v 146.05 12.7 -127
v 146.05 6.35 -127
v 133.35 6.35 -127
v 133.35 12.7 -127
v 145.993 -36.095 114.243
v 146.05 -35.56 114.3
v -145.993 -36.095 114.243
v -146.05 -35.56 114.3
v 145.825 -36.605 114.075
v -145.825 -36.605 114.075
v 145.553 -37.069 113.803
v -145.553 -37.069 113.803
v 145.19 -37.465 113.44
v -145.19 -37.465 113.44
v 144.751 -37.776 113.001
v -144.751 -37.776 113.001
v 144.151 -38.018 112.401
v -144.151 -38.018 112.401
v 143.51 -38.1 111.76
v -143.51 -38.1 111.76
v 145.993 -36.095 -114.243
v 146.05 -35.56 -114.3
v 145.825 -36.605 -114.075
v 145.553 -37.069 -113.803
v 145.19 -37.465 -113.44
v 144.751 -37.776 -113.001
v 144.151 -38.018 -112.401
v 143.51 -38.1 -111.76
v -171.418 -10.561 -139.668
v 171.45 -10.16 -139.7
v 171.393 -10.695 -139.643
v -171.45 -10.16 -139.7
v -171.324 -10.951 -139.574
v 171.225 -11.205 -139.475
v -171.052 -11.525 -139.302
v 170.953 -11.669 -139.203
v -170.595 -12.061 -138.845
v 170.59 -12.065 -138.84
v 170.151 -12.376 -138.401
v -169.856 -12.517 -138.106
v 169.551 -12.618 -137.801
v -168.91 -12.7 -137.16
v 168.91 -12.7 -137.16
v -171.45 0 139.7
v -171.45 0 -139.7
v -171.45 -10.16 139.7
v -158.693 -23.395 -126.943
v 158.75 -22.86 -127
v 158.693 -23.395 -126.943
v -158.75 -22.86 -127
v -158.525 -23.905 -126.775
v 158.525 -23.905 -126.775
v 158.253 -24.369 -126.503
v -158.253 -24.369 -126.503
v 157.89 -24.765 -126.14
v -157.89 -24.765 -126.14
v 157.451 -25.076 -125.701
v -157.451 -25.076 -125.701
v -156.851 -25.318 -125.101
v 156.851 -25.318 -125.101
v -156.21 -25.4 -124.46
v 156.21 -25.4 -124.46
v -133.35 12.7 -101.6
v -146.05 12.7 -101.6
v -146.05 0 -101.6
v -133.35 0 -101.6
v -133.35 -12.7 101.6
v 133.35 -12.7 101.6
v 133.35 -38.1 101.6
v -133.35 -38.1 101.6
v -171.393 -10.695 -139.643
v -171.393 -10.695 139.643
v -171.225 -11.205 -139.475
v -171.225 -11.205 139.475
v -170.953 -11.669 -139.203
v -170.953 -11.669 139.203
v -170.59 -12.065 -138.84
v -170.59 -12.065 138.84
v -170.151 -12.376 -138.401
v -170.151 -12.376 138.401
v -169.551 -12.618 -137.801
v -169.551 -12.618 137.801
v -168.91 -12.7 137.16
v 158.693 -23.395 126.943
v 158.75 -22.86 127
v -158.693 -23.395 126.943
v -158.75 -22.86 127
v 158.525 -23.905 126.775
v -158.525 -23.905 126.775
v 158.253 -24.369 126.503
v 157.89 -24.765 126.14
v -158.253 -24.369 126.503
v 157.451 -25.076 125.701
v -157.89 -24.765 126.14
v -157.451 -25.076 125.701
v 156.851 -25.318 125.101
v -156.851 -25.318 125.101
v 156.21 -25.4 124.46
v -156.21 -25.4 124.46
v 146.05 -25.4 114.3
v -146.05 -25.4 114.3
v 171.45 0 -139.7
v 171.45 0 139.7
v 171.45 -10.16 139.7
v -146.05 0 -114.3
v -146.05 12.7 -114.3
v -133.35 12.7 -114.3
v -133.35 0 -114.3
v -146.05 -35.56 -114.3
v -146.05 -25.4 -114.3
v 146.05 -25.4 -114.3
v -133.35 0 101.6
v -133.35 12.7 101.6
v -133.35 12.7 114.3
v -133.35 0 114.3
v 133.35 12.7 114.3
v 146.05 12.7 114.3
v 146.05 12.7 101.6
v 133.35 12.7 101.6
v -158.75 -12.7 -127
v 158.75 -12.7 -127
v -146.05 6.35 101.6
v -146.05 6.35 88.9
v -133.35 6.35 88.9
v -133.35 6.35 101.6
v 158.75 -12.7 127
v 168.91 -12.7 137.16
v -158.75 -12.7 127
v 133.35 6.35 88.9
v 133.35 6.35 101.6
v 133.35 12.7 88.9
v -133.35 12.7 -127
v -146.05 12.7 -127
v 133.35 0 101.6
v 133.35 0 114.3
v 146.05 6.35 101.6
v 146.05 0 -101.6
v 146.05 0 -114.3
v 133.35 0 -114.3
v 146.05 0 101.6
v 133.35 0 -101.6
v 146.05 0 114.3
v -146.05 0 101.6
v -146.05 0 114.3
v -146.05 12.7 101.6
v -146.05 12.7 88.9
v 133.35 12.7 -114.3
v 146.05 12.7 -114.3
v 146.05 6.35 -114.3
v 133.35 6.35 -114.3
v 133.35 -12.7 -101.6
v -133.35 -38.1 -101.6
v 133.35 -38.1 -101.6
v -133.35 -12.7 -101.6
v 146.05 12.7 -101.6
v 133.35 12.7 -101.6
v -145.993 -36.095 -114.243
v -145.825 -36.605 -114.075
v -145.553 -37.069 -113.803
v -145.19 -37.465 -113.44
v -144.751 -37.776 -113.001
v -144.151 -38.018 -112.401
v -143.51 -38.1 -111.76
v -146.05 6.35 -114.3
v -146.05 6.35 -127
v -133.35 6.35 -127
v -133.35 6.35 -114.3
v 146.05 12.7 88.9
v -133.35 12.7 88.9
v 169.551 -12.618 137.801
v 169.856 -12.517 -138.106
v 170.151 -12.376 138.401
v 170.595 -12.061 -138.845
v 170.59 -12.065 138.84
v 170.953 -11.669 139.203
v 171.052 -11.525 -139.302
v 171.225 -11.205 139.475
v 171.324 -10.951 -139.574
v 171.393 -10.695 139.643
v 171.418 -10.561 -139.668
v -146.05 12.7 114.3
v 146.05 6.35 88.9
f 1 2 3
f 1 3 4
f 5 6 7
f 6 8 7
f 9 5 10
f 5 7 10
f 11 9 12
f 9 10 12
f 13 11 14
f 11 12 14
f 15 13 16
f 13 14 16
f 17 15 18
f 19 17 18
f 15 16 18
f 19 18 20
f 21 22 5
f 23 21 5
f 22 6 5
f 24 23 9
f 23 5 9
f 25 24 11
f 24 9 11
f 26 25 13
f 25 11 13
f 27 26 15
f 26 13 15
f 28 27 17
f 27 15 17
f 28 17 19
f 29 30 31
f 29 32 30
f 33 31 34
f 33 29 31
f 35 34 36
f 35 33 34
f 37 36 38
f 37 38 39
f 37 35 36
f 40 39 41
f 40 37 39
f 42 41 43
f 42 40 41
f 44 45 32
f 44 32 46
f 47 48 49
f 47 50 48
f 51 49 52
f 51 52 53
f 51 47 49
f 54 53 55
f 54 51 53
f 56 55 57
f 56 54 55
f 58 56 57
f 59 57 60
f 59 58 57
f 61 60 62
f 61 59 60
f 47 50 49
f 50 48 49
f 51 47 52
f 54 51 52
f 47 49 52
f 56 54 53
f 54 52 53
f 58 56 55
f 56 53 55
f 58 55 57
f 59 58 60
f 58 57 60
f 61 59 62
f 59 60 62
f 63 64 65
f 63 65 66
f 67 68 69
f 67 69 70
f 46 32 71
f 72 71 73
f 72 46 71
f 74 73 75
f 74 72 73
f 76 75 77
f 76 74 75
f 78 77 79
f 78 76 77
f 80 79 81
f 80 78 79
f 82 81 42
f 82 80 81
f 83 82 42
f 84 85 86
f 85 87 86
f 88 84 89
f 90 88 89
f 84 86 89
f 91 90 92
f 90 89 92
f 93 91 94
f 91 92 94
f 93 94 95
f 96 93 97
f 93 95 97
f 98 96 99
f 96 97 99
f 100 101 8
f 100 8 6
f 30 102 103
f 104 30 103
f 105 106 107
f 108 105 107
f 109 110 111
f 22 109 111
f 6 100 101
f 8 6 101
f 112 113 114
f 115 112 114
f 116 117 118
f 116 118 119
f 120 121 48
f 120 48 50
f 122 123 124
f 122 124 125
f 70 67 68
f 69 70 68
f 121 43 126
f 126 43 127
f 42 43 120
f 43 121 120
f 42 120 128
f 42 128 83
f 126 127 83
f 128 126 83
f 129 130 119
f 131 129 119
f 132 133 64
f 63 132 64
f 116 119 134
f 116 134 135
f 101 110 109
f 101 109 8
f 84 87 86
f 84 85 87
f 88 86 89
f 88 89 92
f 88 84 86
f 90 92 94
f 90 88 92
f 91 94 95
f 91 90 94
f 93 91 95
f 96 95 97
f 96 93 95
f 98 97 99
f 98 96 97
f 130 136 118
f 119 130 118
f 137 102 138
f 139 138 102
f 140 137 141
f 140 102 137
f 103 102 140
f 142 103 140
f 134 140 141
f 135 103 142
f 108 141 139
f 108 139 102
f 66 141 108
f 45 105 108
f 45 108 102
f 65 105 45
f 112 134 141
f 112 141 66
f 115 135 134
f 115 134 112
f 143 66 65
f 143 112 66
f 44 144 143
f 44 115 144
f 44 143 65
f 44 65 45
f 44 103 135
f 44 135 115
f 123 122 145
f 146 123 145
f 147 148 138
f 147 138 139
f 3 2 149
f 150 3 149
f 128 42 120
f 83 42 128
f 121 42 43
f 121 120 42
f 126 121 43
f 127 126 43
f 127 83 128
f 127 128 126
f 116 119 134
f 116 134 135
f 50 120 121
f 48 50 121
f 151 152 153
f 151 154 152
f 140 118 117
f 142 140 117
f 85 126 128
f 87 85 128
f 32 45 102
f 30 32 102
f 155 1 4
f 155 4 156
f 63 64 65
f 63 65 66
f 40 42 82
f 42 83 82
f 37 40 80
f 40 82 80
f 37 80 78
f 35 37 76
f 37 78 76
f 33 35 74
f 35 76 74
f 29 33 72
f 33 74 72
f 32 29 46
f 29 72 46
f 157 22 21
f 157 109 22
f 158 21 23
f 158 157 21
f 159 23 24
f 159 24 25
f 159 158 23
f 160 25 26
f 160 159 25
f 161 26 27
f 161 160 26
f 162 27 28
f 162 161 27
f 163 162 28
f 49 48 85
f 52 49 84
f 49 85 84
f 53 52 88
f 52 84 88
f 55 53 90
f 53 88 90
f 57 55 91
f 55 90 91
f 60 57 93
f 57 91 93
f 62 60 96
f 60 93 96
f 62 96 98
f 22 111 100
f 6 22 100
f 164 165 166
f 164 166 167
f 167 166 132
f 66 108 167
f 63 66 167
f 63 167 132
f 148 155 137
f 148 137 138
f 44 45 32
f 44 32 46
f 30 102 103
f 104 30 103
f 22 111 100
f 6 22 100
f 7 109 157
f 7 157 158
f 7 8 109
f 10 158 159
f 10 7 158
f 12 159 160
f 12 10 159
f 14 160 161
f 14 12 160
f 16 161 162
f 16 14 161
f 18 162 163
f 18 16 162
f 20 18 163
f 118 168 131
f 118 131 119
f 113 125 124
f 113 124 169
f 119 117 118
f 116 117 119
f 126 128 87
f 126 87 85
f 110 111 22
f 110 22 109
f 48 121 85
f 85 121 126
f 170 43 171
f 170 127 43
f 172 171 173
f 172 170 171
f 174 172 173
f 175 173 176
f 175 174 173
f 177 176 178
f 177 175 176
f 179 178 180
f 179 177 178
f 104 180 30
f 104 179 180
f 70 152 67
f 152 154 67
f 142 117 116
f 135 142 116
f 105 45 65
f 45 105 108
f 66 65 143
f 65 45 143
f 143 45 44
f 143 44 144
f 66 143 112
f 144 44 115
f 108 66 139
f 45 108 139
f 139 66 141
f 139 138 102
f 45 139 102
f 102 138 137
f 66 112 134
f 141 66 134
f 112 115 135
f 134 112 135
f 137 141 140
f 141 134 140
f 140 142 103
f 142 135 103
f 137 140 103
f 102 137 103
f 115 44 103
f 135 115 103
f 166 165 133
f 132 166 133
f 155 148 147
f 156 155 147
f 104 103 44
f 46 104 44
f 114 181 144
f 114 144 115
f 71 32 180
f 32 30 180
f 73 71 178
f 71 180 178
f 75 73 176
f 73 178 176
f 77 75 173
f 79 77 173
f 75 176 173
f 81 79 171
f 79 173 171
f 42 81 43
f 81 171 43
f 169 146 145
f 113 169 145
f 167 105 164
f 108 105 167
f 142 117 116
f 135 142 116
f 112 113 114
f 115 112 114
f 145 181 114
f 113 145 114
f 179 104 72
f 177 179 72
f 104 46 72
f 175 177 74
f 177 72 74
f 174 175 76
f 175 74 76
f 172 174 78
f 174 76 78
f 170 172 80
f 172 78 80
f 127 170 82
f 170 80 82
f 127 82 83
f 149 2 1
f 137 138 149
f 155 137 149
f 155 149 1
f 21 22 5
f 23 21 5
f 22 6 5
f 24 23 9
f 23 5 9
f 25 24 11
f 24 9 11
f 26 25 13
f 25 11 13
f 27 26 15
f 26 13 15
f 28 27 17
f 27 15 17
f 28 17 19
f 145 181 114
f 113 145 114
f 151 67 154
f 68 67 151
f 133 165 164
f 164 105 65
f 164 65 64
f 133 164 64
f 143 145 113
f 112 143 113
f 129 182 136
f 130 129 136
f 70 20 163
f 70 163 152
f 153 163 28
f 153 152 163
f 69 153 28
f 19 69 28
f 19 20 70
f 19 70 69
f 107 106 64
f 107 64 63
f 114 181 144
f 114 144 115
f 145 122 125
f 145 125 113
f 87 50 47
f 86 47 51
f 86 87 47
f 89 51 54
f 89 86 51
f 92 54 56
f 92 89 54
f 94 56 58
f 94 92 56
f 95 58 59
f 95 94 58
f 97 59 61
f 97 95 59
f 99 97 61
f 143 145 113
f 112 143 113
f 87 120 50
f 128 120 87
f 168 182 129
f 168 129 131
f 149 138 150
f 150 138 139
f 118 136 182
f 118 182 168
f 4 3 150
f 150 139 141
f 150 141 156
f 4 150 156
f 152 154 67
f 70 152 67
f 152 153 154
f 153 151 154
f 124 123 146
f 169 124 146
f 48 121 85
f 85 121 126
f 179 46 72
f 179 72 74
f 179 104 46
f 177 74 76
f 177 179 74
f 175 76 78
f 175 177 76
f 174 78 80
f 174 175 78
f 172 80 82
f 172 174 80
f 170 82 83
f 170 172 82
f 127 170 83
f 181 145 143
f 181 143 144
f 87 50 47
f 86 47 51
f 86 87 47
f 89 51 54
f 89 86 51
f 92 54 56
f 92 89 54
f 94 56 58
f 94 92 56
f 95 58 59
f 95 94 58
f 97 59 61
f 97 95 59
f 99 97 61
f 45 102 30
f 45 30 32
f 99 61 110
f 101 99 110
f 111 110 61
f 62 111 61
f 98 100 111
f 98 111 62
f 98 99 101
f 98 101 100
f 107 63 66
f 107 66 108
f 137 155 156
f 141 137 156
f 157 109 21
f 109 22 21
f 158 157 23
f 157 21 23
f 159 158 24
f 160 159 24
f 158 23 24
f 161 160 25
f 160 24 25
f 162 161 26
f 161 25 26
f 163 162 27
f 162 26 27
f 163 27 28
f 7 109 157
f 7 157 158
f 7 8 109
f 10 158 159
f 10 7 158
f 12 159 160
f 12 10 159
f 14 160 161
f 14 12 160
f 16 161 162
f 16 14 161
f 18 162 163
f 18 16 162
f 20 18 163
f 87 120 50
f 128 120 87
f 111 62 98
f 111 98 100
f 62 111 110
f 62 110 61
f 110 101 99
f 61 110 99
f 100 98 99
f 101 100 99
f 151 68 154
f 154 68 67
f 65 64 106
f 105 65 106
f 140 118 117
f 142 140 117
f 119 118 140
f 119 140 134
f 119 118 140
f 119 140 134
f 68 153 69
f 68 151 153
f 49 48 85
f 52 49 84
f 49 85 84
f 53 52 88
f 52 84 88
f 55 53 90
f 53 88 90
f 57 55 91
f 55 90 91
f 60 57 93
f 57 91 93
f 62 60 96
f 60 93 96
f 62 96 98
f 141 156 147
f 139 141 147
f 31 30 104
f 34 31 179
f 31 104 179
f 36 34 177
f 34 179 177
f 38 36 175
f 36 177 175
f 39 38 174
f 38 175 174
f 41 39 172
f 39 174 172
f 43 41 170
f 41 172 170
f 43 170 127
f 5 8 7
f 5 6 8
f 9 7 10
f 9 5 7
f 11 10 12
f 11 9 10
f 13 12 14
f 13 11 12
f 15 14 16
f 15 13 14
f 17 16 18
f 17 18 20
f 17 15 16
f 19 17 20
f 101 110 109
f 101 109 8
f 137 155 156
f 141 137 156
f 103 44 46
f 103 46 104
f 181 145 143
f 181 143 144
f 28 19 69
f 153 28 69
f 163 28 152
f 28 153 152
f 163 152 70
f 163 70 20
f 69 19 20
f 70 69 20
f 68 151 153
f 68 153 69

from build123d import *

# Parameters (mm, degrees)
F0_W      = 342.9
F0_H      = 279.4
F1_DEPTH  = 12.7
F2_W      = 317.5
F2_H      = 254
F3_DEPTH  = 12.7
F4_W      = 292.1
F4_H      = 228.6
F5_DEPTH  = 12.7
F6_T      = -12.7
F7_W      = 279.4
F7_H      = 3.175
F8_DEPTH  = 25.4
F9_R      = 2.54
F10_W     = 12.7
F10_H     = 12.7
F11_DEPTH = 12.7
F14_W     = 6.35
F14_H     = 12.7
F15_DEPTH = 12.7
F17_W     = 6.35
F17_H     = 12.7
F18_DEPTH = 12.7


# Not quite as in the source:
# - a feature of the source that left no trace in its solid (it failed there, or was rolled back) is left out
# - a shell that OpenCascade refuses in one call is made with other operations: the cavity is built on its own and cut out


with BuildPart() as f1:
    # F0 (on Front) → F1 (new body)
    with BuildSketch(Plane.XZ):
        Rectangle(F0_W, F0_H)
    extrude(amount=F1_DEPTH)

    # F2 (on face) → F3 (join)
    with BuildSketch(Plane.XZ.offset(12.7)):
        Rectangle(F2_W, F2_H)
    extrude(amount=F3_DEPTH)

    # F4 (on face) → F5 (join)
    with BuildSketch(Plane.XZ.offset(25.4)):
        Rectangle(F4_W, F4_H)
    extrude(amount=F5_DEPTH)

    # F6: a shell. OpenCascade refuses it in one call, so the cavity is built on its own and cut out:
    # the body offset inwards by the wall thickness, plus a prism from it out through each open face.
    f6_core = offset(f1.part, amount=F6_T, kind=Kind.INTERSECTION, mode=Mode.PRIVATE)
    f6_exits = [f6_core.faces().sort_by_distance(p)[0] for p in [
        (0, -25.4, 0),
    ]]
    add(f6_core, mode=Mode.SUBTRACT)
    extrude(f6_exits, amount=-F6_T, mode=Mode.SUBTRACT)

    # F7 (on face) → F8 (cut)
    with BuildSketch(Plane.XY.offset(127)):
        with Locations((0.0025813838, -20.3239014355)):
            Rectangle(F7_W, F7_H)
    extrude(amount=-F8_DEPTH, mode=Mode.SUBTRACT)

    # F9
    f9_edges = [f1.edges().sort_by_distance(p)[0] for p in [
        (0, -38.1, 114.3),
        (146.05, -38.1, 0),
        (158.75, -25.4, 0),
        (0, -25.4, 127),
        (0, -12.7, 139.7),
        (171.45, -12.7, 0),
        (0, -38.1, -114.3),
        (0, -25.4, -127),
        (0, -12.7, -139.7),
        (-171.45, -12.7, 0),
        (-158.75, -25.4, 0),
        (-146.05, -38.1, 0),
    ]]
    fillet(f9_edges, radius=F9_R)

    # F10 (on face) → F11 (join)
    with BuildSketch(Plane(origin=(0, 0, 0), x_dir=(-1, 0, 0), z_dir=(0, 1, 0))):
        with Locations((-139.7, 107.95)):
            Rectangle(F10_W, F10_H)
    extrude(amount=F11_DEPTH)

    # F12: F1 across plane


with BuildPart() as f1_1:
    add(f1.part)
    add(f1.part.mirror(Plane.YZ))

    # F13: F1 across plane


with BuildPart() as f1_2:
    add(f1_1.part)
    add(f1_1.part.mirror(Plane.XY))

    # F17 (on face) → F18 (join)
    with BuildSketch(Plane.YZ.offset(146.05)):
        with Locations((9.525, -120.65)):
            Rectangle(F17_W, F17_H)
    extrude(amount=-F18_DEPTH)


with BuildPart() as f15:
    # F14 (on face) → F15 (new body)
    with BuildSketch(Plane.YZ.offset(146.05)):
        with Locations((9.525, 95.25)):
            Rectangle(F14_W, F14_H)
    extrude(amount=-F15_DEPTH)


with BuildPart() as f16_1:
    # F16: instance of F15
    add(f15.part.mirror(Plane.YZ))


with BuildPart() as f19_1:
    # F19: instance of F1
    add(f1_2.part.mirror(Plane.YZ))


solid = Compound([f1_2.part, f15.part, f16_1.part, f19_1.part])
